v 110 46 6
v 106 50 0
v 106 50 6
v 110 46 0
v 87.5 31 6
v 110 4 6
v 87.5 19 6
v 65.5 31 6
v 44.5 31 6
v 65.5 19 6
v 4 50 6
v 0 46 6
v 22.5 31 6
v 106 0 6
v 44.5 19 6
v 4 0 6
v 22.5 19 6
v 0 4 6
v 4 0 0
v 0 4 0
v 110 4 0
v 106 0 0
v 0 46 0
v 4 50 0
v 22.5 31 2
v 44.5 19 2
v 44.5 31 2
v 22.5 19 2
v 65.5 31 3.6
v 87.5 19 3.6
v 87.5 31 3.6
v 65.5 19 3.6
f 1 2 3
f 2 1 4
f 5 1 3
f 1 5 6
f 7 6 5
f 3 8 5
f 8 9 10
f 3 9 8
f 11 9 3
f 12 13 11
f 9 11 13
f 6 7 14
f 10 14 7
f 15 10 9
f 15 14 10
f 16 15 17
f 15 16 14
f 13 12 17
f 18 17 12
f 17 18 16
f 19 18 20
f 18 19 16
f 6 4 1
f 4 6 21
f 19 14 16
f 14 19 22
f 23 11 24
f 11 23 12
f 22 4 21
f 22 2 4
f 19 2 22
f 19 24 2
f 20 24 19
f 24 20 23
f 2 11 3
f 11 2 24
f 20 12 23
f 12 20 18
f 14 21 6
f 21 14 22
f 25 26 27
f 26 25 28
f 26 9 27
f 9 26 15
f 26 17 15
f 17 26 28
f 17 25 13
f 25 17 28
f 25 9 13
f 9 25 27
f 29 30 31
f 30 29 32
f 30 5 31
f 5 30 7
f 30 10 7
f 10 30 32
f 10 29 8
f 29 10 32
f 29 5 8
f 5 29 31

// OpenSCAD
$fn = 32;

// ----------------------------------------------------------------------
// Windowed plate: 2 voids, 110 x 50 x 6 mm
// ----------------------------------------------------------------------

// --- parameters (mm) ---
plate_l = 110;            // plate length, X
plate_w = 50;             // plate width, Y
plate_t = 6;              // plate thickness, Z
edge_margin = 12;         // wall from the plate edge to any window
windows = 2;              // number of windows in the row
win_l = 22;               // window length
win_w = 12;               // window width
win_pitch = 43;           // window pitch along X
depth_1 = 4;              // depth of void 1 (full thickness = through)
depth_2 = 2.4;            // depth of void 2 (full thickness = through)
corner_c = 4;             // corner chamfer of the plate

profile = [[4, 0], [106, 0], [110, 4], [110, 46], [106, 50], [4, 50], [0, 46], [0, 4]];  // primary outline, 8 points, counter clockwise
void_1 = [[22.5, 19], [44.5, 19], [44.5, 31], [22.5, 31]];  // window 1 of the row, 4 points
void_2 = [[65.5, 19], [87.5, 19], [87.5, 31], [65.5, 31]];  // window 2 of the row, 4 points

// --- the one profile operation ---
difference() {
  linear_extrude(height = plate_t) polygon(points = profile);
  translate([0, 0, plate_t - depth_1])
    linear_extrude(height = depth_1 + 1) polygon(points = void_1);
  translate([0, 0, plate_t - depth_2])
    linear_extrude(height = depth_2 + 1) polygon(points = void_2);
}
